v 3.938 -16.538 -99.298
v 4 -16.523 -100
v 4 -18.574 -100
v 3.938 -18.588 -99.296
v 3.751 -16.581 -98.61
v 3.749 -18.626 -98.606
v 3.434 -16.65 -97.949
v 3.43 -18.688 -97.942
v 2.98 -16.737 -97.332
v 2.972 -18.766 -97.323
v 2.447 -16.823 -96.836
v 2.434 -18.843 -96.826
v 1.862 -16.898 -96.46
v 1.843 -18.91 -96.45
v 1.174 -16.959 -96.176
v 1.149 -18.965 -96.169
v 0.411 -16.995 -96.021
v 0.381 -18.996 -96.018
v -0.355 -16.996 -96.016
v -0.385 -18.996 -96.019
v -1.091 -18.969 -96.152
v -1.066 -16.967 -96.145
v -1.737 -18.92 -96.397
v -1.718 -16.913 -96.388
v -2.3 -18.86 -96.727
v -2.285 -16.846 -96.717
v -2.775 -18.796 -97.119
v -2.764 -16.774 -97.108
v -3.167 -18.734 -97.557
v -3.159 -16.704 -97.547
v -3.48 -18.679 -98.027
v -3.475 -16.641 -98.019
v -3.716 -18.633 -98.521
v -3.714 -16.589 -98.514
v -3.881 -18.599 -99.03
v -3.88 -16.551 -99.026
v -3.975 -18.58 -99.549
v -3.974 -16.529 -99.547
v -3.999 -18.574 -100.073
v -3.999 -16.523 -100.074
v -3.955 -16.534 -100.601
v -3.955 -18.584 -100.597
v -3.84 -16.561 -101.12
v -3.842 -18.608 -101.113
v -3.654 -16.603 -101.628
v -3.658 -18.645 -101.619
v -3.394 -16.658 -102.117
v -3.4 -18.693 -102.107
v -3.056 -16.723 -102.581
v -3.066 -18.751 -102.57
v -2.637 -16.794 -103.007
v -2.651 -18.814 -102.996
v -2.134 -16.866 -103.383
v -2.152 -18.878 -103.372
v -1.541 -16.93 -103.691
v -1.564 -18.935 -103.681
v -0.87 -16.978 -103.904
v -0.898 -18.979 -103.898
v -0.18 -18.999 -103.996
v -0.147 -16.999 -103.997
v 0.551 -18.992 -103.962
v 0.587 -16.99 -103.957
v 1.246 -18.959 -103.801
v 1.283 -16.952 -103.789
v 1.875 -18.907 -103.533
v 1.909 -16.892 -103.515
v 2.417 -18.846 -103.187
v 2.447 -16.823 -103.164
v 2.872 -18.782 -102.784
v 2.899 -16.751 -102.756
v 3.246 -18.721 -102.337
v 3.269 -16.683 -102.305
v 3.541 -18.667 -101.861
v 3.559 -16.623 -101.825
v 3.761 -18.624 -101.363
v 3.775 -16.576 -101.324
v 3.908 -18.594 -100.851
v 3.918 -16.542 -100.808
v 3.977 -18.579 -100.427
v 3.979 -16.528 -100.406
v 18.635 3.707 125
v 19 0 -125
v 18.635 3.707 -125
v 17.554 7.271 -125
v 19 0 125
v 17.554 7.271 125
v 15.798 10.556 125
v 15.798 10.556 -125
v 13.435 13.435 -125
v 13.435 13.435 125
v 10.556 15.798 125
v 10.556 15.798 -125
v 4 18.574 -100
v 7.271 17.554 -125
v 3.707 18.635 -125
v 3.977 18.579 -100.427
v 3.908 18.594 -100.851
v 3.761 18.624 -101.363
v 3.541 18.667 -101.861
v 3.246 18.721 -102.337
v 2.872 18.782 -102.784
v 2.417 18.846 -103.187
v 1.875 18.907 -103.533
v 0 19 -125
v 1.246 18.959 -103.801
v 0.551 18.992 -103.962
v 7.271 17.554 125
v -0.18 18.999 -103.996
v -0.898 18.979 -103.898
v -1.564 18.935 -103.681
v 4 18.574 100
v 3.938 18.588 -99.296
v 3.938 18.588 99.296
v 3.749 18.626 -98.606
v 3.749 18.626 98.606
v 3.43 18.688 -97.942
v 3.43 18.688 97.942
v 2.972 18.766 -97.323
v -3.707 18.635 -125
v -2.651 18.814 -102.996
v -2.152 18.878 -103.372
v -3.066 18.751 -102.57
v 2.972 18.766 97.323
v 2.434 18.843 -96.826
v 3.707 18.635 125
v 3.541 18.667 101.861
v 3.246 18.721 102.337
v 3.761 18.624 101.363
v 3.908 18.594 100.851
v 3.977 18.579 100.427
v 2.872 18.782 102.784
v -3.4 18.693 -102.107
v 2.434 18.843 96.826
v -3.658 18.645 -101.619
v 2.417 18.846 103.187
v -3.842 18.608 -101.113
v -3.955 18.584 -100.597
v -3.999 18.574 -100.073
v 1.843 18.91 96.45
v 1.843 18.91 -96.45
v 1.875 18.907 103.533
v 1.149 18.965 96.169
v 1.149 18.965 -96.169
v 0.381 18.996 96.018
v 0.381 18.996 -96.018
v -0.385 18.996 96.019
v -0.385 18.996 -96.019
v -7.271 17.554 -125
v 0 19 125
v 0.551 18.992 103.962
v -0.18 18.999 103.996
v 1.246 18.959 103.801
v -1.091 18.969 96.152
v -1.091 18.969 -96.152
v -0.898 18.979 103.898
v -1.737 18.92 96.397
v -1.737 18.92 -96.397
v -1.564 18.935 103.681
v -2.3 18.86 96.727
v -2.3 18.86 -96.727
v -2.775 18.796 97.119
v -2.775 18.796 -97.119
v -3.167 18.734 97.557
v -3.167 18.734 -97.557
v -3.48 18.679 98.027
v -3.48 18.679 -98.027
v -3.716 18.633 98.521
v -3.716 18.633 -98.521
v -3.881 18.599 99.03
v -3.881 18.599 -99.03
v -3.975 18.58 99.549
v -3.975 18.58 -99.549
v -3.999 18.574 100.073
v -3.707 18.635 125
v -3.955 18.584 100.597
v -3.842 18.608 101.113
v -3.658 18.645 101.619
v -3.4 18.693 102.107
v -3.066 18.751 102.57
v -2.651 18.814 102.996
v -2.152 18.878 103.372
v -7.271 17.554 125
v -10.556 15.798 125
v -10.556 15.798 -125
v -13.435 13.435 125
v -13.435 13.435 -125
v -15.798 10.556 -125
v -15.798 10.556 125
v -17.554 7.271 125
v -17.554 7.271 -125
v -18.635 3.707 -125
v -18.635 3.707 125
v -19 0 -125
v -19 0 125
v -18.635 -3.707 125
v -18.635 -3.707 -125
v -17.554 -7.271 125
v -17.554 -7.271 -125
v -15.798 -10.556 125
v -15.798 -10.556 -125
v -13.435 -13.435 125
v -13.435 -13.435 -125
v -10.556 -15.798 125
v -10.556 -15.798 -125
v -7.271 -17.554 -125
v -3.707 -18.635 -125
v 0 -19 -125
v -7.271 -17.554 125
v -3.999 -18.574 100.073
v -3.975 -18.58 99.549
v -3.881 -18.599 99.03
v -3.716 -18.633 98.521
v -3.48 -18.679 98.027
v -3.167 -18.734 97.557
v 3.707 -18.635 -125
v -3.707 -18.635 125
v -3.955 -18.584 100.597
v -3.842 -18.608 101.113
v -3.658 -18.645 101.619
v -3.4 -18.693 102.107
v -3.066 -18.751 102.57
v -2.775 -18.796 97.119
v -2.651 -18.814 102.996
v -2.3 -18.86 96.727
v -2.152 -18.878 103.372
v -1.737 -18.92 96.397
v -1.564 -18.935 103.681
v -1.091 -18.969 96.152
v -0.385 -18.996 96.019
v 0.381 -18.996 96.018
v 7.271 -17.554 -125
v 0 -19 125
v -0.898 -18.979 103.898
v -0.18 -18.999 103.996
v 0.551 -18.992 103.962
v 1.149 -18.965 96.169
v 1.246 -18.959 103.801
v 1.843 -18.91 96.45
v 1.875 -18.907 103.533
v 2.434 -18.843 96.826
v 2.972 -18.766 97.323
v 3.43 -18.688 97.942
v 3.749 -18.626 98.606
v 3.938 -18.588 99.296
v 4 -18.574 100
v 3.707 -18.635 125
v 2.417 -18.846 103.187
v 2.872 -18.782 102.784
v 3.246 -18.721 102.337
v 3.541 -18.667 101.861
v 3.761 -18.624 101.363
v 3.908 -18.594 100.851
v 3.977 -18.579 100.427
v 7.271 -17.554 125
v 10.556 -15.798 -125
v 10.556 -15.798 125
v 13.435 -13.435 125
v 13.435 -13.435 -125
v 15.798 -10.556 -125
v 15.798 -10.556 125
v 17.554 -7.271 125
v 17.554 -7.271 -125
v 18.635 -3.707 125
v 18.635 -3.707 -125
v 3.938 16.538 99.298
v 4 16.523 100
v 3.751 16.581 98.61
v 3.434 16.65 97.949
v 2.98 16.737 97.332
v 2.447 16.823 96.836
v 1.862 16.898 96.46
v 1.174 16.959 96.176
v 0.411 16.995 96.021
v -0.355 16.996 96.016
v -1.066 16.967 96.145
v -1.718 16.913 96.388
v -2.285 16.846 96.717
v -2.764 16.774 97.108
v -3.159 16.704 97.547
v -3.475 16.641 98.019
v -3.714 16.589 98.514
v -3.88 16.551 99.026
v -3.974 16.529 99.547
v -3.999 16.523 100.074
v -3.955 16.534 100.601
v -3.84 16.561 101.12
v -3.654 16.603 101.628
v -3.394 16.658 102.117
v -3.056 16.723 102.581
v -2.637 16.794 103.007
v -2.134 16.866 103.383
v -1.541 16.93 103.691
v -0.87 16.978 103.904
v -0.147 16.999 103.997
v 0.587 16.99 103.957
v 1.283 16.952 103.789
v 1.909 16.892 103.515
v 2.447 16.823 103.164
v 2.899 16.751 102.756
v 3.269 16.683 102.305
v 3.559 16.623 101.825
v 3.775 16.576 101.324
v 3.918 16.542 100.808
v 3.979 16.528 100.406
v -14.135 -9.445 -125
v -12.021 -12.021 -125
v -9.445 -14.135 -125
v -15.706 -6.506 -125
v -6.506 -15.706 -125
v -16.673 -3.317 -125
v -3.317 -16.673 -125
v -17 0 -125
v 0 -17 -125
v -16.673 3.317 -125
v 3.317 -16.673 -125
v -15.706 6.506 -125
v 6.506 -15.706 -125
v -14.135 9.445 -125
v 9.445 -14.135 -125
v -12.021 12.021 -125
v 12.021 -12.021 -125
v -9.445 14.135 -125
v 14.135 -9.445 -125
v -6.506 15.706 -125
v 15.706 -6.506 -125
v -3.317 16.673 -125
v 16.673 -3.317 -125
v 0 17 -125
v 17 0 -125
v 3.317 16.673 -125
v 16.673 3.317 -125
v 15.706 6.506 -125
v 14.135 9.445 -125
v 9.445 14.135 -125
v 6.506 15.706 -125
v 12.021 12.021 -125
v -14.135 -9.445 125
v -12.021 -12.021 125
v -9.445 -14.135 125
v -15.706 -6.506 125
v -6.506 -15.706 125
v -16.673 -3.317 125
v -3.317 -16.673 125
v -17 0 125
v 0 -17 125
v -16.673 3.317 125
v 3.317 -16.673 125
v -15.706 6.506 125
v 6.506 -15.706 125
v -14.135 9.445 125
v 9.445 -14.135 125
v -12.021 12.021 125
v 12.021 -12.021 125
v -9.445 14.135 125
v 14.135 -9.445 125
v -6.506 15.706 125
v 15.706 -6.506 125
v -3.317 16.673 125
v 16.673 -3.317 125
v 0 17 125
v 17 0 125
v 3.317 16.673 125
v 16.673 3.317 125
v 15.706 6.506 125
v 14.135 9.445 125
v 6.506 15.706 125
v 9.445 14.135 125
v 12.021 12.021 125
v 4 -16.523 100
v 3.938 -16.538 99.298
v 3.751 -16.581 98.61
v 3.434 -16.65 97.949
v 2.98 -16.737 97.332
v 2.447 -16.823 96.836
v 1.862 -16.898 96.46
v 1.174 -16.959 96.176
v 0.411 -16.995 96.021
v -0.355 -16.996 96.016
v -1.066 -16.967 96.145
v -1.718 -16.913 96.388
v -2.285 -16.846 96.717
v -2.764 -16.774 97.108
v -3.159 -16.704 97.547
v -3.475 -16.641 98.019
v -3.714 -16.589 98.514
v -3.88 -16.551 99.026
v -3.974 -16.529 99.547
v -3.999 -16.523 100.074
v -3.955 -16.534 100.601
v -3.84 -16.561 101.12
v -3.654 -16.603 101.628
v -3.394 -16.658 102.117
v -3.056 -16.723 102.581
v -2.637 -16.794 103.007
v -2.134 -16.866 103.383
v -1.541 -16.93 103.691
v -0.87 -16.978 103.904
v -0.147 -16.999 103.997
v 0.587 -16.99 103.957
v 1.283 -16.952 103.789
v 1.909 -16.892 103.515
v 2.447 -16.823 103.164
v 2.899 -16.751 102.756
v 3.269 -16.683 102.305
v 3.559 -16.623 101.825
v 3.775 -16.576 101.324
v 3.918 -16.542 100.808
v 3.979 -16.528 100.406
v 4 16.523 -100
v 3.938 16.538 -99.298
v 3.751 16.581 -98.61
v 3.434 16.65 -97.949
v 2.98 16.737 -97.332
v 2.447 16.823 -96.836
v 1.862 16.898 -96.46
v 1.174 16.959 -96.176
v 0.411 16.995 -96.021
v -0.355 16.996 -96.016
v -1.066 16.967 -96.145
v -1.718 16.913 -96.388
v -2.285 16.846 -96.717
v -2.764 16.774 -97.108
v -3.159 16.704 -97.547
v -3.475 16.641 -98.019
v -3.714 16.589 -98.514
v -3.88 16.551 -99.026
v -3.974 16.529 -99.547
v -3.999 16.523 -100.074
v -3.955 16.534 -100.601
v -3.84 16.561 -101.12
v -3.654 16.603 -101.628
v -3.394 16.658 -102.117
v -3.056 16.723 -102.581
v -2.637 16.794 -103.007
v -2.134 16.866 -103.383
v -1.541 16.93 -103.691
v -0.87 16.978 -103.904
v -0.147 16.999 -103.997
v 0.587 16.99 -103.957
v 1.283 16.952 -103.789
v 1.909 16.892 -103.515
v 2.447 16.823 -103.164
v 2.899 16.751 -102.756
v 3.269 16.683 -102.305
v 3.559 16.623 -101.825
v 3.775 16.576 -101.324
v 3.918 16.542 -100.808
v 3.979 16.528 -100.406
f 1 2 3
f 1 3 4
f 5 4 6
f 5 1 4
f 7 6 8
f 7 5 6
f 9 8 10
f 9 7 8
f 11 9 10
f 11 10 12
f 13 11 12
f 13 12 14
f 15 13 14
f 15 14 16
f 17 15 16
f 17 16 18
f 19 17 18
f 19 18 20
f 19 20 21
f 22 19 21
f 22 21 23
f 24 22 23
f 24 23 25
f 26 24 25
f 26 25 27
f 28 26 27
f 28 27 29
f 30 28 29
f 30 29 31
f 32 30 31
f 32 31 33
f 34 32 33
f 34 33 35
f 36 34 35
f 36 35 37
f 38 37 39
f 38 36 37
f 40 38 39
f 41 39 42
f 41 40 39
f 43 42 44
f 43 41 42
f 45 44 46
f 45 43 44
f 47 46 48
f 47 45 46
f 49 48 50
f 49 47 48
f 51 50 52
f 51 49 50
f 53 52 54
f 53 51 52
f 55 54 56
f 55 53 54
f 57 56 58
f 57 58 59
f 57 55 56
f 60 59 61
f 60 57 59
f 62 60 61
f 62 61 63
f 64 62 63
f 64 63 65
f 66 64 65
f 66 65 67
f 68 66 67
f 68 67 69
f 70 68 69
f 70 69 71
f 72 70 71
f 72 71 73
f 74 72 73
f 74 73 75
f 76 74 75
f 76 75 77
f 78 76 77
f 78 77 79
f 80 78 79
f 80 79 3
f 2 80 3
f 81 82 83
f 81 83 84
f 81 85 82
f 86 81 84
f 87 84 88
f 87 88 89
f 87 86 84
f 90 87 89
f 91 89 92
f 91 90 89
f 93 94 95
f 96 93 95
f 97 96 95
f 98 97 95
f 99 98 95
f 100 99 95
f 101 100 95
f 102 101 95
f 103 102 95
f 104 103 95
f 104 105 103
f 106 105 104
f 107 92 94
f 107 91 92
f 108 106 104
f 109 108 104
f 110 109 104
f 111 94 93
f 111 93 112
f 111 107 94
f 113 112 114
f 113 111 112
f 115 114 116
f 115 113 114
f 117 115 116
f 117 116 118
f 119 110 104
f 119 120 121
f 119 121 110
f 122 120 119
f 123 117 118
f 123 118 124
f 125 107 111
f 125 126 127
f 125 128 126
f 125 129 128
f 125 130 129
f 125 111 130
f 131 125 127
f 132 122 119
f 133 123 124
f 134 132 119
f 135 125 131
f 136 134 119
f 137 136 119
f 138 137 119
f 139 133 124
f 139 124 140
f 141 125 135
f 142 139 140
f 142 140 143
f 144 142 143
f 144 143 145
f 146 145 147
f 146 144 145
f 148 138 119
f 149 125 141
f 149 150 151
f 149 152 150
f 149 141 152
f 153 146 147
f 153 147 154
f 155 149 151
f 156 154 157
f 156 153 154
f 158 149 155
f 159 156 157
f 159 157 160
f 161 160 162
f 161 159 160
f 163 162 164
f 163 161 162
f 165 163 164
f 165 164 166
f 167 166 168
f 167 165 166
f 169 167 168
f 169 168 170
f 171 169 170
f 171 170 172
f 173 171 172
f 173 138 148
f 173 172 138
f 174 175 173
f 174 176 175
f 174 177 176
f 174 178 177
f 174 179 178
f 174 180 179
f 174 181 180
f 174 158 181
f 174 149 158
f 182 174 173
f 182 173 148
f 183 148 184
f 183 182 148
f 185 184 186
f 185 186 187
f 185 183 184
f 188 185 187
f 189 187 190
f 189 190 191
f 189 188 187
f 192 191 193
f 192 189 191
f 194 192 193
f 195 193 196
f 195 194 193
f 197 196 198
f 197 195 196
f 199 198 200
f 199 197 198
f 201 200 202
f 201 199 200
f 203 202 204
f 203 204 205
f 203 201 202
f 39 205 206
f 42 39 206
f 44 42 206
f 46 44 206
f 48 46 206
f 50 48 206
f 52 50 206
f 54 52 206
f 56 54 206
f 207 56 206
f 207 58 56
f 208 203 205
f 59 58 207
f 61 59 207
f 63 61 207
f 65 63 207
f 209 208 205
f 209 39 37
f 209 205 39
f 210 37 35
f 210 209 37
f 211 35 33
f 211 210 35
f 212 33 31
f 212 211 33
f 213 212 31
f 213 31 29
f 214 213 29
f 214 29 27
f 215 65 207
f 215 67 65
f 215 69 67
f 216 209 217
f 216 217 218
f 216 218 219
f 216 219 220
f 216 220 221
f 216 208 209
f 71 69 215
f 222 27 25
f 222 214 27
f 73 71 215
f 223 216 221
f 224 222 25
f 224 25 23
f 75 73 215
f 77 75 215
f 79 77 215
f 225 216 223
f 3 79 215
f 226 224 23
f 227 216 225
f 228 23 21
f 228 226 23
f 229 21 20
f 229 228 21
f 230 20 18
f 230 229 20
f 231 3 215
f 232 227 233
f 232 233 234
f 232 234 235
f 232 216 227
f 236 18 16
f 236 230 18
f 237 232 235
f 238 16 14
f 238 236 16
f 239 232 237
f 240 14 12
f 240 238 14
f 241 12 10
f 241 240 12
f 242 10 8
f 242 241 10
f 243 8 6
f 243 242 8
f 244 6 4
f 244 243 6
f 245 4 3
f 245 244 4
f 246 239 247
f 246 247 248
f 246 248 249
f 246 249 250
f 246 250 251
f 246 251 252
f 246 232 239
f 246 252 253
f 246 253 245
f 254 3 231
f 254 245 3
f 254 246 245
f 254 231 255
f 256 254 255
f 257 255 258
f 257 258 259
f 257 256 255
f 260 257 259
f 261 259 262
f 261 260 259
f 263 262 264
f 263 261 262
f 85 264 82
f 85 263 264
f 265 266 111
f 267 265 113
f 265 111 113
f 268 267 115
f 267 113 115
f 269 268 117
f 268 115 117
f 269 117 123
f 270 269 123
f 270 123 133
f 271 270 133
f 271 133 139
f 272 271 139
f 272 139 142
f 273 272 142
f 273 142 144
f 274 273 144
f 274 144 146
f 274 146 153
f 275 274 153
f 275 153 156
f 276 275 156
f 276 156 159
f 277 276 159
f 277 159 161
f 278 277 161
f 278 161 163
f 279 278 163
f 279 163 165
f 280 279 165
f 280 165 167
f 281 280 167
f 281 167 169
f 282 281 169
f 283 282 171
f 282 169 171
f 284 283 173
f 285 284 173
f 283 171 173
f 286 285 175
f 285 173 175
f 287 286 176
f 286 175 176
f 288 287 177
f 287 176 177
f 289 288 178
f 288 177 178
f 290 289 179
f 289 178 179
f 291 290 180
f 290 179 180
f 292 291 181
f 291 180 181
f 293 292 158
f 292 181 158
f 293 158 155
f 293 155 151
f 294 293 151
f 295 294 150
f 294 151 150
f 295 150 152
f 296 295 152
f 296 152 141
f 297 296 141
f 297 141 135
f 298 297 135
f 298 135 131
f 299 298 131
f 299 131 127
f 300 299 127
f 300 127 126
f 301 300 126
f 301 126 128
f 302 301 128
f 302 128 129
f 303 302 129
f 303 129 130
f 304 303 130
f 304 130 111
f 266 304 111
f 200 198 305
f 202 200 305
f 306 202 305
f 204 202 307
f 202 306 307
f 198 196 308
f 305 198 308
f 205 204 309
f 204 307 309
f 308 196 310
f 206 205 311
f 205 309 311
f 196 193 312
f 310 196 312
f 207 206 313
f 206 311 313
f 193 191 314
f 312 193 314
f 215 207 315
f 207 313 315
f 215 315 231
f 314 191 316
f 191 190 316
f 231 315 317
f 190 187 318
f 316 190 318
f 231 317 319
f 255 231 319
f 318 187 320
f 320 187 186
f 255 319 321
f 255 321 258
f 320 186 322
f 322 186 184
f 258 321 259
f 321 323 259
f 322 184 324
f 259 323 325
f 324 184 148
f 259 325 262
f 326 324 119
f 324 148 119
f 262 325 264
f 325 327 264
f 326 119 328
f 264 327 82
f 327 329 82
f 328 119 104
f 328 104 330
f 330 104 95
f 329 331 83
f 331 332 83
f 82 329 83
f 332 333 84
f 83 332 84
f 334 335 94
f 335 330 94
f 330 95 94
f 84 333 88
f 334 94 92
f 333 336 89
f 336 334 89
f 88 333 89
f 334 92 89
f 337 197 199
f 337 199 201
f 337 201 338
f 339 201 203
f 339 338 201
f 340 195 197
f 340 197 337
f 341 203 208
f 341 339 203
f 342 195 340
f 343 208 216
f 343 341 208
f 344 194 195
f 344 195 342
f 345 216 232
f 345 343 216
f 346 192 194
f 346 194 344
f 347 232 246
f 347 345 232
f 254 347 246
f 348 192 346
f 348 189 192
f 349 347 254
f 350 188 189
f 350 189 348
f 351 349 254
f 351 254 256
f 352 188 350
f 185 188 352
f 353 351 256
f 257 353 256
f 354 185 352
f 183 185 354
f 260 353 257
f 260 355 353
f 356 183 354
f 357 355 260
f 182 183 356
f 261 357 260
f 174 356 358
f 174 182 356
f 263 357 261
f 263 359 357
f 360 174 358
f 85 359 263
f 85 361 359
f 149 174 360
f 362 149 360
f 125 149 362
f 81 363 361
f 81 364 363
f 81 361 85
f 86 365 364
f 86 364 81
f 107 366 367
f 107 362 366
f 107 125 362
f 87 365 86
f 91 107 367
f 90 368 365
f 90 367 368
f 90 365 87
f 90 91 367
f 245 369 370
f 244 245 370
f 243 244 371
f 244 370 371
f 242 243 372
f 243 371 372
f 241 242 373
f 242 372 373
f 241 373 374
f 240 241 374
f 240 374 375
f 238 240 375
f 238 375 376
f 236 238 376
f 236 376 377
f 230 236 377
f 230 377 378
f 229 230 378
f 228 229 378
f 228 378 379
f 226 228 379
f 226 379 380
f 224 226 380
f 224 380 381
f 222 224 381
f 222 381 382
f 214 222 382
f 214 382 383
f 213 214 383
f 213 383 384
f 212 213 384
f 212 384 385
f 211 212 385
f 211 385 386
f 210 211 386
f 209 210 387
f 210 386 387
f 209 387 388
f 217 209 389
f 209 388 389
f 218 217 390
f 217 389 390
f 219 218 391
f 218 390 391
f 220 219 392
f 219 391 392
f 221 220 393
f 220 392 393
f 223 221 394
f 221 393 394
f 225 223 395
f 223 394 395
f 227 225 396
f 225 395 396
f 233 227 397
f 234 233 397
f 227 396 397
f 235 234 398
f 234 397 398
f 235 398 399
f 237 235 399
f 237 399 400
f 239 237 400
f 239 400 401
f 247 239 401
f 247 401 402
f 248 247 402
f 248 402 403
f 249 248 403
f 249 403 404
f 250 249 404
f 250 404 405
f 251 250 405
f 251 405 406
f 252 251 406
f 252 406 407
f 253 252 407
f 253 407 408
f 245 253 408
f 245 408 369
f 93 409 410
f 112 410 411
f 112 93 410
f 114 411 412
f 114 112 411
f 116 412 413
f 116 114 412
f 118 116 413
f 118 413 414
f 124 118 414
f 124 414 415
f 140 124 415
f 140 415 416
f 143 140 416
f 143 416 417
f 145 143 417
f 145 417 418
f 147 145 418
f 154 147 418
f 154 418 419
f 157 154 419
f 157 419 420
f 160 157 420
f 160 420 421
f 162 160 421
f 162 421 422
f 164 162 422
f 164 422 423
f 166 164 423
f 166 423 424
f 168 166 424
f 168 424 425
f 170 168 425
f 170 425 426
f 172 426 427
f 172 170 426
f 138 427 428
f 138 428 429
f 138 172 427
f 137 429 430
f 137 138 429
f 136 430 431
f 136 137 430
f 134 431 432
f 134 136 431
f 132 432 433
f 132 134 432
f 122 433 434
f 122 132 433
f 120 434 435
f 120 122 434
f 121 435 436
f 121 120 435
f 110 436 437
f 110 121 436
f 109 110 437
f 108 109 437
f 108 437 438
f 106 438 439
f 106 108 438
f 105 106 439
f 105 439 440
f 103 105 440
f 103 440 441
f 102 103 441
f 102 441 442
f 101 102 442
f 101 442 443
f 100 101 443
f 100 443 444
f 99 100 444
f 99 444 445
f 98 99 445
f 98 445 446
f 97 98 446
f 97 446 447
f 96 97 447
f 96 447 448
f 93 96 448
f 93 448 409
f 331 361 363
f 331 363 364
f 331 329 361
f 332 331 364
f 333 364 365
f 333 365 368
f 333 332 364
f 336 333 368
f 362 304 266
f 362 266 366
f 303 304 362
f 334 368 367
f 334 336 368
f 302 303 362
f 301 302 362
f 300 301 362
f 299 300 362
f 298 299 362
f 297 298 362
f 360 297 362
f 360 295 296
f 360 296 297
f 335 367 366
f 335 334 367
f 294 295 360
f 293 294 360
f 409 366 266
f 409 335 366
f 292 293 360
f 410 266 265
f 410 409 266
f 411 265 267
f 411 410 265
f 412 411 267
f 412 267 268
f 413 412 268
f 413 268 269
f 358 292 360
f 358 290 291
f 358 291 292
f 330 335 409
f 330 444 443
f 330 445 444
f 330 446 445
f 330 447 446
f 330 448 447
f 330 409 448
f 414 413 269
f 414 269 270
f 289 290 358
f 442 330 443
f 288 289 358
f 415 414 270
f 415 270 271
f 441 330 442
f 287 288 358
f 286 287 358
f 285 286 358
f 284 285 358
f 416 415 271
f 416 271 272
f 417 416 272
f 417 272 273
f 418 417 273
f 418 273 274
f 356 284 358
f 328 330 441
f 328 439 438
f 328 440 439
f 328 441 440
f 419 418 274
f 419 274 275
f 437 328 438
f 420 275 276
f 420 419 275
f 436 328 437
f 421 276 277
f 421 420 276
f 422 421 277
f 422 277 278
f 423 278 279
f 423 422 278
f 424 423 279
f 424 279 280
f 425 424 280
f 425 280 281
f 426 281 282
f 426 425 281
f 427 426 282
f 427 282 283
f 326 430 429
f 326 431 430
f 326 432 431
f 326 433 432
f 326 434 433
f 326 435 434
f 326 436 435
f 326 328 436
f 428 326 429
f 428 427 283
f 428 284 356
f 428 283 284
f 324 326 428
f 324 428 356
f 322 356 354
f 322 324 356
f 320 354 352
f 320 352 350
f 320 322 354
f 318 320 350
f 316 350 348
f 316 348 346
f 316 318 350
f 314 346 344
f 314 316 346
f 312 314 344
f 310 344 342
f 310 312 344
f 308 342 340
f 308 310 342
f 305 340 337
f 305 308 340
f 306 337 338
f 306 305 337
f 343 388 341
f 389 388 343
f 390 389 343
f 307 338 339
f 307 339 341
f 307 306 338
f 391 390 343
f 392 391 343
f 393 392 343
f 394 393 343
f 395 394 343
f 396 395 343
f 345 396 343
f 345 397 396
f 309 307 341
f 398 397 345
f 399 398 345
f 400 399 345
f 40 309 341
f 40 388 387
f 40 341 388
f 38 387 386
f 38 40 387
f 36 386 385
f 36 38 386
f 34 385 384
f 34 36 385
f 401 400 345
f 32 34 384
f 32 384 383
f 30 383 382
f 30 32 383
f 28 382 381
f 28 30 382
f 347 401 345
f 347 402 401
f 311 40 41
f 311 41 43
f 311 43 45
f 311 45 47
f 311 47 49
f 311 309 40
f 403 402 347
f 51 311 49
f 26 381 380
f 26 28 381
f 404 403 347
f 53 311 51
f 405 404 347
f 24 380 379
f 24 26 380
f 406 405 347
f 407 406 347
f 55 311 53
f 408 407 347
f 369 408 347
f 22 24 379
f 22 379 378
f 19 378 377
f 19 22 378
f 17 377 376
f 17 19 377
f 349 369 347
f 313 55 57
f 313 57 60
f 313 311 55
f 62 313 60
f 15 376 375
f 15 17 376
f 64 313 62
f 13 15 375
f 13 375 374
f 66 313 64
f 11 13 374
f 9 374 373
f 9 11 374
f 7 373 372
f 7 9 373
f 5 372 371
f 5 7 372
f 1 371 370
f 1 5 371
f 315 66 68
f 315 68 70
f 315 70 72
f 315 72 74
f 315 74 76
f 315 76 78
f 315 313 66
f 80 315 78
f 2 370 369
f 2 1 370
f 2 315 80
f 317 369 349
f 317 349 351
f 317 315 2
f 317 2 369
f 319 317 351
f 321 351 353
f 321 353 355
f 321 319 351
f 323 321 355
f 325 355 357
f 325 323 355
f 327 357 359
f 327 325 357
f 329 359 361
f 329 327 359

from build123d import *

# Parameters (mm, degrees)
SKETCH1_R           = 19
SKETCH1_R_2         = 17
BOSS_EXTRUDE1_DEPTH = 125
SKETCH4_R           = 4
CUT_EXTRUDE3_DEPTH  = 41


with BuildPart() as part:
    # Sketch1 → Boss-Extrude1 (new body, symmetric)
    with BuildSketch(Plane.XY):
        Circle(SKETCH1_R)
        Circle(SKETCH1_R_2, mode=Mode.SUBTRACT)
    extrude(amount=BOSS_EXTRUDE1_DEPTH, both=True)

    # Sketch4 → Cut-Extrude3 (cut, through all)
    with BuildSketch(Plane(origin=(0, 21, 0), x_dir=(1, 0, 0), z_dir=(0, 1, 0))):
        with Locations((0, -100)):
            Circle(SKETCH4_R)
    cut_extrude3 = extrude(amount=-CUT_EXTRUDE3_DEPTH, mode=Mode.SUBTRACT)

    # Mirror1: Cut-Extrude3 across plane
    add(cut_extrude3.mirror(Plane.XY), mode=Mode.SUBTRACT)


solid = part.part
